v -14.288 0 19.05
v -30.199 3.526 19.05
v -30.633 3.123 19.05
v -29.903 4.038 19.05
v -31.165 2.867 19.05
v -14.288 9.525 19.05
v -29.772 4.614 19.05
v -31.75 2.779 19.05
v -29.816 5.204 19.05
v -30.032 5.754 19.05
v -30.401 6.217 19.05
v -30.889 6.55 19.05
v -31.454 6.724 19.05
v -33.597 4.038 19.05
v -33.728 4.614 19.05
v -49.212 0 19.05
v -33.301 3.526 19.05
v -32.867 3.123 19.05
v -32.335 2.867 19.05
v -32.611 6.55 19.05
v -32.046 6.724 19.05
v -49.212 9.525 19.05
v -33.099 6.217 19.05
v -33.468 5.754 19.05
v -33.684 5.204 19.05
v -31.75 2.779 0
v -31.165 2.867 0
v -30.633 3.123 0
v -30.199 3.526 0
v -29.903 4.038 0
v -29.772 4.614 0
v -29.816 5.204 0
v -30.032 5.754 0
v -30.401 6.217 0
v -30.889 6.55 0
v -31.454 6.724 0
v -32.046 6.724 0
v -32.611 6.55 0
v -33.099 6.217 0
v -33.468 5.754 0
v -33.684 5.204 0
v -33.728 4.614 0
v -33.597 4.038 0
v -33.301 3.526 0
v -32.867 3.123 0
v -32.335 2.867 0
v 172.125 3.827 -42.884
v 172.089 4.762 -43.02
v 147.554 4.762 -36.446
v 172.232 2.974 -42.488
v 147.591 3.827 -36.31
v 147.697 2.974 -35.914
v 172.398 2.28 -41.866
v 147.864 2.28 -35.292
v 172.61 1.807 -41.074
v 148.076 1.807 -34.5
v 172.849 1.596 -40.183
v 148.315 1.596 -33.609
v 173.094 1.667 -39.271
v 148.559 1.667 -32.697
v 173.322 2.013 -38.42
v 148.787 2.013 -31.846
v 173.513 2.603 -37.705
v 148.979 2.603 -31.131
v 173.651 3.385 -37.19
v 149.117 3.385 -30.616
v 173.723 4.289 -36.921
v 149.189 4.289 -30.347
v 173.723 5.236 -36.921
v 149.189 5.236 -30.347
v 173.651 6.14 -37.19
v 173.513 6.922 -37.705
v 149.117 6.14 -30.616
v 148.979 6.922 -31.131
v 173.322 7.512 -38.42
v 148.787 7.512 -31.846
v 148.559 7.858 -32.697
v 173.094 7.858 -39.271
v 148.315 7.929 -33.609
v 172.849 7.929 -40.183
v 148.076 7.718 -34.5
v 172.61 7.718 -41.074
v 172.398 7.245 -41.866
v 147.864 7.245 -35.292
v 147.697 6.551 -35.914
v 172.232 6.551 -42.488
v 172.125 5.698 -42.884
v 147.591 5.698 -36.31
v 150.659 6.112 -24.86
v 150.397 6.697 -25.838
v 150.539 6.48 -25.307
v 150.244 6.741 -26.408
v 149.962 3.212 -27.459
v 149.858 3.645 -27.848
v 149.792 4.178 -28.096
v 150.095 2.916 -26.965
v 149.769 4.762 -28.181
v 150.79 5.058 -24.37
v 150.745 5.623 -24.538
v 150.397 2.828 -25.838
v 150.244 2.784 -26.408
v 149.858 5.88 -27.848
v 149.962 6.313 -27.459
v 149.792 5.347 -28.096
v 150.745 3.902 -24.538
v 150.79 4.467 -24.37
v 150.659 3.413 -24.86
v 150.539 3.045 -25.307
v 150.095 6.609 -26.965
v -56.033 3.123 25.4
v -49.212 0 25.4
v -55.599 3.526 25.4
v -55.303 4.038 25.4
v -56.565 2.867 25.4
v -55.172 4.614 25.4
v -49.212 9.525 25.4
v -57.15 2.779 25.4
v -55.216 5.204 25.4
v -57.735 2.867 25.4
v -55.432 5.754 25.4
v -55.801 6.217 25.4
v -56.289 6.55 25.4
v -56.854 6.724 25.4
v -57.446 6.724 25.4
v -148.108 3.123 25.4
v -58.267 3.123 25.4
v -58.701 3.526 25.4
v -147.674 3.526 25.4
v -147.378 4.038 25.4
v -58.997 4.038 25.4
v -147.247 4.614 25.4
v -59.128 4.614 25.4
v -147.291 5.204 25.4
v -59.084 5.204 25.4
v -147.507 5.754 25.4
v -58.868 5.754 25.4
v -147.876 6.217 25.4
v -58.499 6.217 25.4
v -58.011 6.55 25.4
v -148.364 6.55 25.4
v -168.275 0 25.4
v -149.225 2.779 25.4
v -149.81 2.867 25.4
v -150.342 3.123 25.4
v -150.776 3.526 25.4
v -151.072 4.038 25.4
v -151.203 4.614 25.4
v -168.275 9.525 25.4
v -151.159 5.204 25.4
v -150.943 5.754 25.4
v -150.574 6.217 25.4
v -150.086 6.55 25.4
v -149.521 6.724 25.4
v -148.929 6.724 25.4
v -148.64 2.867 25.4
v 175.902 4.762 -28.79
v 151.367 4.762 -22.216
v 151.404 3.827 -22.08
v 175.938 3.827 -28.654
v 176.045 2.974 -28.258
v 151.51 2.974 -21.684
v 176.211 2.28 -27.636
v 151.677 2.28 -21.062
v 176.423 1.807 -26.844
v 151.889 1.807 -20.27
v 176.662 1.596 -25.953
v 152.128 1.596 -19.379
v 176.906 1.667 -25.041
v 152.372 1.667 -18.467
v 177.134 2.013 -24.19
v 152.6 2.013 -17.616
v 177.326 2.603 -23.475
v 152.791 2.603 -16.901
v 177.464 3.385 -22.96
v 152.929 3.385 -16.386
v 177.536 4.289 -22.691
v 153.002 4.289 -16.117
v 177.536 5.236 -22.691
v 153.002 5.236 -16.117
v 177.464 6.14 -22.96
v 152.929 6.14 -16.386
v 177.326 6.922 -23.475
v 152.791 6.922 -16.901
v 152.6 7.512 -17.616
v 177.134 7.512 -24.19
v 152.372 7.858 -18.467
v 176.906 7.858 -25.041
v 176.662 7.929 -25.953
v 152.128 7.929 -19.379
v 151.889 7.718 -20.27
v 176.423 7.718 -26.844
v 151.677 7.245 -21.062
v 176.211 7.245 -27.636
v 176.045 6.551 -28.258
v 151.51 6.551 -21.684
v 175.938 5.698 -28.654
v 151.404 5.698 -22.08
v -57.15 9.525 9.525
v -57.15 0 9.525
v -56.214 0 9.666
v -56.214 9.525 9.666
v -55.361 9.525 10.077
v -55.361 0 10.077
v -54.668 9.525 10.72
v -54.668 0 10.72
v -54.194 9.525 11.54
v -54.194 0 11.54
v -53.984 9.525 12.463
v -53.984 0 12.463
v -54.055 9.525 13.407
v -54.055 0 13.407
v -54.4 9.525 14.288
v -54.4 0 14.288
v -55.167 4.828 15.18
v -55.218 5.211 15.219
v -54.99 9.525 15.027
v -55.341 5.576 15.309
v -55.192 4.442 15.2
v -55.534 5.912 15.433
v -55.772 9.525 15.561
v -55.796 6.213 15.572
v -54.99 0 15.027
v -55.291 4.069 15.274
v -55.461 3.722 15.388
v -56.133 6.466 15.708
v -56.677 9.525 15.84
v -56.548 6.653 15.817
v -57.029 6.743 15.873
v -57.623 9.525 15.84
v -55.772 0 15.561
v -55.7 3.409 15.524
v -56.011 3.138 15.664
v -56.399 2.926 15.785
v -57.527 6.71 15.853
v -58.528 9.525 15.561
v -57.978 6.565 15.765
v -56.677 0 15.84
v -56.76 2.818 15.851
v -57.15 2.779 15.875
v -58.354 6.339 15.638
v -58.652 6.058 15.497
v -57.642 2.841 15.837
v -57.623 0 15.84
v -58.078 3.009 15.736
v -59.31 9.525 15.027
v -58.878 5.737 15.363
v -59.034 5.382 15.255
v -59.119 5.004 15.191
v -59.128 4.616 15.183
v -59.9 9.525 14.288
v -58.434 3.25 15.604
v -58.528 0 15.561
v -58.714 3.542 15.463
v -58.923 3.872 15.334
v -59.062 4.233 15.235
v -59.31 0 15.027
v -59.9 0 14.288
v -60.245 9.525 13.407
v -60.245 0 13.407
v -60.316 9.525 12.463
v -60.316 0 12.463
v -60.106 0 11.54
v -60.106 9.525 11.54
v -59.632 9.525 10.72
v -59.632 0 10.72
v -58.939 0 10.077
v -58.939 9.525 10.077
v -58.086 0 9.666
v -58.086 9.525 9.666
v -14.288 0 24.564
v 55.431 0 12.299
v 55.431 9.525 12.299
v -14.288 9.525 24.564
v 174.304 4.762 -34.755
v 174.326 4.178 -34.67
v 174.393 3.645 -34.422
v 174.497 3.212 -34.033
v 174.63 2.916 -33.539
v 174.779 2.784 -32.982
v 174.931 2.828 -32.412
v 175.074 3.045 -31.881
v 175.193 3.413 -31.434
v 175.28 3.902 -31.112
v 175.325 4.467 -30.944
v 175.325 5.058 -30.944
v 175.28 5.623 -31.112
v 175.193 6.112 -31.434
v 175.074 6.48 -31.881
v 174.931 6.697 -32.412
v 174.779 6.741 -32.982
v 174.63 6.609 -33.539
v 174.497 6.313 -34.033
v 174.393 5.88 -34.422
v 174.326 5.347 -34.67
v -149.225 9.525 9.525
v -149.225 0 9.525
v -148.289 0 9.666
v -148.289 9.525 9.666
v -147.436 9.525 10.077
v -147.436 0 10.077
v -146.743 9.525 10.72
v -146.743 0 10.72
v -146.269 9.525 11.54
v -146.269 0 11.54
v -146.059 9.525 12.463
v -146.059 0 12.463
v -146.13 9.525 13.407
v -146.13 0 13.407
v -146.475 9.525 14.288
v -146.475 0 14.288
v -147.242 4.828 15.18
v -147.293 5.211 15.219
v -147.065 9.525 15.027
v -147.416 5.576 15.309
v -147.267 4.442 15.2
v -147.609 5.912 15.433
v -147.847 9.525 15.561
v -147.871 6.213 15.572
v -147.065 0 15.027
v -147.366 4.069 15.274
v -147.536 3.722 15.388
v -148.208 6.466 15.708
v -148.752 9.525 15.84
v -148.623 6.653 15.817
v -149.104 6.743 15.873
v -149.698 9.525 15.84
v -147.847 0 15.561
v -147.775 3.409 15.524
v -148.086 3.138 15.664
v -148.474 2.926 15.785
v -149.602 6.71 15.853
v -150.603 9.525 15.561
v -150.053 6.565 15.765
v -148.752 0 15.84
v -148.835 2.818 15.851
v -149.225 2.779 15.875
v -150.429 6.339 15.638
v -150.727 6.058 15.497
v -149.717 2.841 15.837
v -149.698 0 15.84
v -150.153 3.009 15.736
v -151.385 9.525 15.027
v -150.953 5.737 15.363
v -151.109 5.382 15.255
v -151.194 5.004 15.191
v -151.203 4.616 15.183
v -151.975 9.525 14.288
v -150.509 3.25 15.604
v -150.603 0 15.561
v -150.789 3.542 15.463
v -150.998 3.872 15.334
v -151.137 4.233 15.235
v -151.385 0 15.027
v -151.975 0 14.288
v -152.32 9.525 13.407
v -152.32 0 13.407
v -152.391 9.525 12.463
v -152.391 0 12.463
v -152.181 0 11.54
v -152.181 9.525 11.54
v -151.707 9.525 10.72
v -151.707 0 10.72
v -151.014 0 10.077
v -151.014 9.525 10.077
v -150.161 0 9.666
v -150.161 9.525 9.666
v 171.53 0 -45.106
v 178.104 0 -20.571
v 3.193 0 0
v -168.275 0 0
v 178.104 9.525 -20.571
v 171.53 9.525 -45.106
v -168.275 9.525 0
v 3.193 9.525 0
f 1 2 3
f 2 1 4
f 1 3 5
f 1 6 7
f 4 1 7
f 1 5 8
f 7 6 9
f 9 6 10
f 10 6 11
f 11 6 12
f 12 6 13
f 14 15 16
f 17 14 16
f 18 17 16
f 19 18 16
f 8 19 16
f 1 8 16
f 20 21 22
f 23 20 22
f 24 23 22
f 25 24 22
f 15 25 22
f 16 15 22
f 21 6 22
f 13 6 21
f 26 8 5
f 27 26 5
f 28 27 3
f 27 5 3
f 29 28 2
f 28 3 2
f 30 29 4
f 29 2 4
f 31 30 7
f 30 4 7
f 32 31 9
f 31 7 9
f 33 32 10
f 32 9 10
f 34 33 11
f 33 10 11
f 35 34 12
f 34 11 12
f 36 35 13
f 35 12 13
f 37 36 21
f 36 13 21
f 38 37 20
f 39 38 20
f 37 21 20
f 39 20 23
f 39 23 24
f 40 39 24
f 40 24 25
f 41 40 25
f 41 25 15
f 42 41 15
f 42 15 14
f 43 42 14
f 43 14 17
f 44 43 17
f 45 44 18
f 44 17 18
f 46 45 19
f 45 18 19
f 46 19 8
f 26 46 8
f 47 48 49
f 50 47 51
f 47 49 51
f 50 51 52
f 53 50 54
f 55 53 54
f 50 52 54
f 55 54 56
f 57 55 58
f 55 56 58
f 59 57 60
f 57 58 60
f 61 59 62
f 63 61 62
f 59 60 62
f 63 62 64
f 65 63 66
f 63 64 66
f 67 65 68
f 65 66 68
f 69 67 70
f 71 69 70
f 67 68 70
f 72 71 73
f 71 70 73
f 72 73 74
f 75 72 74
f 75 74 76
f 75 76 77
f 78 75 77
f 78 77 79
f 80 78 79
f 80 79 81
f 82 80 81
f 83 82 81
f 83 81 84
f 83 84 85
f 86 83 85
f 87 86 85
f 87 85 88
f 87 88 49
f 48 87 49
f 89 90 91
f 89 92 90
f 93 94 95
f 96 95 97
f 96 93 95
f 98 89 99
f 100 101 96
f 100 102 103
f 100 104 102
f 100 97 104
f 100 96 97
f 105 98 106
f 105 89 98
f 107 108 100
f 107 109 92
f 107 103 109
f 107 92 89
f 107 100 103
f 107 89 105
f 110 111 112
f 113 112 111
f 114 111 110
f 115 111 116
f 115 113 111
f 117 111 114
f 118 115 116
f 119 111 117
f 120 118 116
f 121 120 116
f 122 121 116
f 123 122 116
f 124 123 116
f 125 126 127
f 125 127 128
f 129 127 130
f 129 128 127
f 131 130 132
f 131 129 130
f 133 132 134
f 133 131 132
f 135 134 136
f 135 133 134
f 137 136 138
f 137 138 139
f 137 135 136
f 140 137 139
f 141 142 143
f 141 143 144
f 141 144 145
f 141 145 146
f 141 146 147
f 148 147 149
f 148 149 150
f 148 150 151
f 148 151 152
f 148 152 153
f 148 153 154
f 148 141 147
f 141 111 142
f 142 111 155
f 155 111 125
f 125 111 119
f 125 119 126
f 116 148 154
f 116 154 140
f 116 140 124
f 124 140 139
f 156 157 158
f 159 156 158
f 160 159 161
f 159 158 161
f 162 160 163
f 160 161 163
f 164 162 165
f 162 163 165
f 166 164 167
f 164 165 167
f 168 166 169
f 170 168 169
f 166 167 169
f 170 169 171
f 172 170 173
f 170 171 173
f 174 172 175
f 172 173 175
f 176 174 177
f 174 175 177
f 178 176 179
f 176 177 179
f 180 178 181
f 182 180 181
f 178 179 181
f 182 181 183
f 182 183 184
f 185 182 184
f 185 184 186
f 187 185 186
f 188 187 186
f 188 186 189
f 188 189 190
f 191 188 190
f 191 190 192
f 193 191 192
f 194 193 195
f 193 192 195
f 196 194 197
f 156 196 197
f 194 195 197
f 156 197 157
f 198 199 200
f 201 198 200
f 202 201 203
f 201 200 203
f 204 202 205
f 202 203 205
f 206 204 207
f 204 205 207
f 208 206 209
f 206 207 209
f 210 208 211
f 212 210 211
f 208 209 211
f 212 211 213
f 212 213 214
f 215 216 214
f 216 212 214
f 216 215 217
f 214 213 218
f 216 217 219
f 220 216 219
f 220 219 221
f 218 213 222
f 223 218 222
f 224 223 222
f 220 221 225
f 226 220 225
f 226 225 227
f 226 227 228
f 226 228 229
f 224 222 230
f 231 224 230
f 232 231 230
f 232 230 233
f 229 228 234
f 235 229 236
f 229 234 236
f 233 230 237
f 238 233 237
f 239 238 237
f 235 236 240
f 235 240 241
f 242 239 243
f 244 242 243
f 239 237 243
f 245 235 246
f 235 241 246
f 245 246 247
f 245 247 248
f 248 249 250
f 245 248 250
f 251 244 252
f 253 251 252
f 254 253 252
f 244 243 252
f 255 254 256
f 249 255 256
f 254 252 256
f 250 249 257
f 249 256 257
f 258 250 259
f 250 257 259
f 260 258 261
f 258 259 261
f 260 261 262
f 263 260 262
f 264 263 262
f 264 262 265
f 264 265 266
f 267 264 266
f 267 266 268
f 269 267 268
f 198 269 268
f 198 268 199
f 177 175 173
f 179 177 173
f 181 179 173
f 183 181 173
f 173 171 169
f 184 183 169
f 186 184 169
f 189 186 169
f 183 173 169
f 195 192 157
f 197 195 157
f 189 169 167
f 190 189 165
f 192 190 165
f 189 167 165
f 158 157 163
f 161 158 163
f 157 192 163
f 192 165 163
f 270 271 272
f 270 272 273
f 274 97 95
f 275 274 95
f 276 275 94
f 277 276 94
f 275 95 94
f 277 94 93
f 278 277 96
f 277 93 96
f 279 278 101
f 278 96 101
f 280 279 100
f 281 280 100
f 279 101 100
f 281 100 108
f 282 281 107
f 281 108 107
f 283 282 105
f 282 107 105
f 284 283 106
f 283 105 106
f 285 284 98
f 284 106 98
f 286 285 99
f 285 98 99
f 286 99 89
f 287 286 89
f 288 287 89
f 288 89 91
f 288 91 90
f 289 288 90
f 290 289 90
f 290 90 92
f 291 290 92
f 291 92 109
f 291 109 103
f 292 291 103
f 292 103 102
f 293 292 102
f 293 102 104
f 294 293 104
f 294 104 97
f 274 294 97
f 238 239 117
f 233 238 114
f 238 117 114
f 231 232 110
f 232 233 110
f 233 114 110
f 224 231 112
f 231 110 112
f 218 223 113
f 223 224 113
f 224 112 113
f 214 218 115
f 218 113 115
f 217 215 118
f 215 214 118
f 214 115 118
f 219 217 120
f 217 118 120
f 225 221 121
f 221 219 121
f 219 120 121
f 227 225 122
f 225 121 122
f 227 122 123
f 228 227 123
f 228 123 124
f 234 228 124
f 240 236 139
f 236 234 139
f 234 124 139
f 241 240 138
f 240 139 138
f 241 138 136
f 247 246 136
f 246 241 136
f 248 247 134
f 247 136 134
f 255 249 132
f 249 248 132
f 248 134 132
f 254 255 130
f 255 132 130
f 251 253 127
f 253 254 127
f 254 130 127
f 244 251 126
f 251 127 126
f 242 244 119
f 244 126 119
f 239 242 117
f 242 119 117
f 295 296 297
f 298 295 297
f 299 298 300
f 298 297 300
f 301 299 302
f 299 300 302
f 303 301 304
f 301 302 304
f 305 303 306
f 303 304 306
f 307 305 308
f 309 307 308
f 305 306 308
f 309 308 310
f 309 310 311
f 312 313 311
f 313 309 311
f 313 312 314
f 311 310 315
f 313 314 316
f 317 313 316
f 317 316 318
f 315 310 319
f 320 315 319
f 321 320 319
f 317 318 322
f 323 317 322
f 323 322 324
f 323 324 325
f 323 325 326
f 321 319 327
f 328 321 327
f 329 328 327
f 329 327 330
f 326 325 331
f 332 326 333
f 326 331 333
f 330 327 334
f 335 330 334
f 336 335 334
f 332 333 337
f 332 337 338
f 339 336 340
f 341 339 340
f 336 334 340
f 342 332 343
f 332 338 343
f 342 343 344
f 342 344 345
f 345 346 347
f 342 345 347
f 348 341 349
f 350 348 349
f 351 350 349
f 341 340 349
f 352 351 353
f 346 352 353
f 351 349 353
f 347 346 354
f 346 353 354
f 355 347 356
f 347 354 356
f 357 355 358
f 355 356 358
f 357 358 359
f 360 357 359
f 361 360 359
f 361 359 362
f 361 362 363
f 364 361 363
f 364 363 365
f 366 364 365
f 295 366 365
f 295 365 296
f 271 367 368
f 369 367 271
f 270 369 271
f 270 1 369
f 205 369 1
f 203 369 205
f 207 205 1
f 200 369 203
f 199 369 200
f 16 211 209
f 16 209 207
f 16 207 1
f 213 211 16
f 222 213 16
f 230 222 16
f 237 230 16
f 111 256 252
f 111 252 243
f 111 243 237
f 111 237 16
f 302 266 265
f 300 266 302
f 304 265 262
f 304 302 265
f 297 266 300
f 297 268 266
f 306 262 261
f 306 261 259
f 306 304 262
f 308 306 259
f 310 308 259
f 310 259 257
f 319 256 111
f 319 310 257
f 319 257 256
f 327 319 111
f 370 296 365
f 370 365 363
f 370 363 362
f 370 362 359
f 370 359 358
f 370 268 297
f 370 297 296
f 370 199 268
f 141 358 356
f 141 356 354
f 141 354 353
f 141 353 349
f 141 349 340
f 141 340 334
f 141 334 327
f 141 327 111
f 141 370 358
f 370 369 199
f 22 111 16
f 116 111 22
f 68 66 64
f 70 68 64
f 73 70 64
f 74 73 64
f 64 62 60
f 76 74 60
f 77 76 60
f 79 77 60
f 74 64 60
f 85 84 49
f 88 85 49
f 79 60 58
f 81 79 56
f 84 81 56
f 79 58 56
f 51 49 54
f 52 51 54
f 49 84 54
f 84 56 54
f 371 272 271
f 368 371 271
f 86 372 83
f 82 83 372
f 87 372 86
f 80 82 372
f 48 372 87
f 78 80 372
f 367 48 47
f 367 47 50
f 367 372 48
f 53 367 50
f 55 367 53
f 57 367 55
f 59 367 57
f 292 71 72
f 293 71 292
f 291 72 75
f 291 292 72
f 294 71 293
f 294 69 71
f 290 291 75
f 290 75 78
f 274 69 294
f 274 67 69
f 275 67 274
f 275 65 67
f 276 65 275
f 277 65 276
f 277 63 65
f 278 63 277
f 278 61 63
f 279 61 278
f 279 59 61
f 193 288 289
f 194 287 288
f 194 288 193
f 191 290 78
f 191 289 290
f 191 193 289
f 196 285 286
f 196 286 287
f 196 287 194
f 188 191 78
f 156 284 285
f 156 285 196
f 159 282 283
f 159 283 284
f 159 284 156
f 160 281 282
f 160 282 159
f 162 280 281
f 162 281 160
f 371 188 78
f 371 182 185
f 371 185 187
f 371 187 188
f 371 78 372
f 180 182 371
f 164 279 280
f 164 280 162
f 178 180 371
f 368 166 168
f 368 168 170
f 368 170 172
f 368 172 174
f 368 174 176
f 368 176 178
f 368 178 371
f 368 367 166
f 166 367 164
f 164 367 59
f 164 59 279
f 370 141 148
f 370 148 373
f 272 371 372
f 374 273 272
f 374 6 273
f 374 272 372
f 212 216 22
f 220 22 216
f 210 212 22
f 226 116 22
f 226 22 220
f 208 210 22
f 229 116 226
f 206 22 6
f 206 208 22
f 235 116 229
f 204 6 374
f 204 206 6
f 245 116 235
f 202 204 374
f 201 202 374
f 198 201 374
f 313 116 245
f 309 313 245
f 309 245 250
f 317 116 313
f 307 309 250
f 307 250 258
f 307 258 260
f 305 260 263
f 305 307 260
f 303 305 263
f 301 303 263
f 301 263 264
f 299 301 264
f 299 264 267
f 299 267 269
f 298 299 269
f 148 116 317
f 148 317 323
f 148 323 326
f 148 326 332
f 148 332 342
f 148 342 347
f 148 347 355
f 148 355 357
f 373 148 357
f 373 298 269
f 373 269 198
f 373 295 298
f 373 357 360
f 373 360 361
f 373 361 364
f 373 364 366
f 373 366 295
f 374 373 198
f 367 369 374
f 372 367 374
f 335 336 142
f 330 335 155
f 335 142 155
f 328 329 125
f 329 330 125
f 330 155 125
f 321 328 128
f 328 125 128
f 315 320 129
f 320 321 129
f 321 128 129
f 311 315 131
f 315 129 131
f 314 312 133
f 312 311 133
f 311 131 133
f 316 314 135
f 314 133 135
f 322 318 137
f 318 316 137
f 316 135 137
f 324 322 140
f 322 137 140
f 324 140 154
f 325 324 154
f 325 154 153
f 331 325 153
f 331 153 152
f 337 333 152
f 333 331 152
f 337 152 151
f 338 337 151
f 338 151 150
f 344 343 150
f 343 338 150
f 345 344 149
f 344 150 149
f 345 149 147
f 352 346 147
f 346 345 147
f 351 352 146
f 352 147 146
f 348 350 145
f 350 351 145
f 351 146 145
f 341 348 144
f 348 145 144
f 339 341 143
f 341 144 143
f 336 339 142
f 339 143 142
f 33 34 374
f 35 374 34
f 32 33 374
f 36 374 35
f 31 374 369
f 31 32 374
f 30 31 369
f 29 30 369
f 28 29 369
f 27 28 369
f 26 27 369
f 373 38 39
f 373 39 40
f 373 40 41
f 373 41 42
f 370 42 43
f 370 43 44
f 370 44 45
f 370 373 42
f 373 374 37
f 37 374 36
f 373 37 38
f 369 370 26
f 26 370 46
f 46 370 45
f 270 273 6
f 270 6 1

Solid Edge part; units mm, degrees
sketch "Sketch1" plane through (0, 0, 0) normal (1, 0, 0) x (0, 1, 0)
  line L0 (0, 0) -> (0, 25.4)
  line L1 (0, 25.4) -> (9.525, 25.4)
  line L2 (9.525, 25.4) -> (9.525, 0)
  line L3 (9.525, 0) -> (0, 0)
  dimension "D1" = 9.525
  dimension "D2" = 25.4
extrude "ExtrudedProtrusion_1" add sketch "Sketch1" along normal blind 6.35 and the other way blind 168.275
hole "Hole_1" at (-57.15, 0, 12.7) direction (0, 1, 0) diameter 6.35 end through all
hole "Hole1" at (-149.225, 0, 12.7) direction (0, 1, 0) diameter 6.35 end through all
hole "Hole2" at (-57.15, 4.7625, 25.4) direction (0, 0, -1) diameter 3.9675 end up to next
hole "Hole3" at (-149.225, 4.7625, 25.4) direction (0, 0, -1) diameter 3.9675 end up to next
hole "Hole_3" at (-31.75, 4.7625, 25.4) direction (0, 0, -1) diameter 3.9675 end through all
sketch "Sketch2" plane through (0, 12.7, 25.4) normal (0, 0, 1) x (1, 0, 0)
  line L0 (-49.2125, -3.175) -> (-14.2875, -3.175)
  line L1 (-14.2875, -3.175) -> (-14.2875, -12.7)
  line L2 (-14.2875, -12.7) -> (-49.2125, -12.7)
  line L3 (-49.2125, -12.7) -> (-49.2125, -3.175)
  dimension "D1" = 17.4625
  dimension "D2" = 34.925
extrude "ExtrudedCutout_1" cut sketch "Sketch2" against normal blind 6.35
sketch "Sketch3" plane through (3.0755, 4.7625, 13.1794) normal (0.9659, 0, -0.2588) x (0, 1, 0)
  line L0 (-4.7625, 12.7) -> (-4.7625, -12.7)
  line L1 (-4.7625, -12.7) -> (4.7625, -12.7)
  line L2 (4.7625, -12.7) -> (4.7625, 12.7)
  line L3 (4.7625, 12.7) -> (-4.7625, 12.7)
  dimension "D1" = 25.4
  dimension "D2" = 9.525
extrude "ExtrudedProtrusion_2" add sketch "Sketch3" along normal blind 177.8
hole "Hole_4" at (174.8171, 4.7625, -32.8386) direction (-0.9659, 0, 0.2588) diameter 3.9675 depth 25.4
hole "Hole4" at (176.7236, 4.7625, -25.7236) direction (-0.9659, 0, 0.2588) diameter 6.35 depth 25.4
hole "Hole5" at (172.9107, 4.7625, -39.9536) direction (-0.9659, 0, 0.2588) diameter 6.35 depth 25.4
sketch "Sketch4" plane through (4.9146, 0, -9.8296) normal (0, -1, 0) x (1, 0, 0)
  line L0 (1.4479, 35.2763) -> (50.517, 22.1283)
  line L1 (50.517, 22.1283) -> (-23.952, 35.2296)
  line L2 (-23.952, 35.2296) -> (1.4479, 35.2763)
  dimension "D1" = 50.8
  dimension "D2" = 25.4
extrude "Cutout1" cut sketch "Sketch4" against normal up to next
properties part number "SR-01" material "Aluminum, 1060"
